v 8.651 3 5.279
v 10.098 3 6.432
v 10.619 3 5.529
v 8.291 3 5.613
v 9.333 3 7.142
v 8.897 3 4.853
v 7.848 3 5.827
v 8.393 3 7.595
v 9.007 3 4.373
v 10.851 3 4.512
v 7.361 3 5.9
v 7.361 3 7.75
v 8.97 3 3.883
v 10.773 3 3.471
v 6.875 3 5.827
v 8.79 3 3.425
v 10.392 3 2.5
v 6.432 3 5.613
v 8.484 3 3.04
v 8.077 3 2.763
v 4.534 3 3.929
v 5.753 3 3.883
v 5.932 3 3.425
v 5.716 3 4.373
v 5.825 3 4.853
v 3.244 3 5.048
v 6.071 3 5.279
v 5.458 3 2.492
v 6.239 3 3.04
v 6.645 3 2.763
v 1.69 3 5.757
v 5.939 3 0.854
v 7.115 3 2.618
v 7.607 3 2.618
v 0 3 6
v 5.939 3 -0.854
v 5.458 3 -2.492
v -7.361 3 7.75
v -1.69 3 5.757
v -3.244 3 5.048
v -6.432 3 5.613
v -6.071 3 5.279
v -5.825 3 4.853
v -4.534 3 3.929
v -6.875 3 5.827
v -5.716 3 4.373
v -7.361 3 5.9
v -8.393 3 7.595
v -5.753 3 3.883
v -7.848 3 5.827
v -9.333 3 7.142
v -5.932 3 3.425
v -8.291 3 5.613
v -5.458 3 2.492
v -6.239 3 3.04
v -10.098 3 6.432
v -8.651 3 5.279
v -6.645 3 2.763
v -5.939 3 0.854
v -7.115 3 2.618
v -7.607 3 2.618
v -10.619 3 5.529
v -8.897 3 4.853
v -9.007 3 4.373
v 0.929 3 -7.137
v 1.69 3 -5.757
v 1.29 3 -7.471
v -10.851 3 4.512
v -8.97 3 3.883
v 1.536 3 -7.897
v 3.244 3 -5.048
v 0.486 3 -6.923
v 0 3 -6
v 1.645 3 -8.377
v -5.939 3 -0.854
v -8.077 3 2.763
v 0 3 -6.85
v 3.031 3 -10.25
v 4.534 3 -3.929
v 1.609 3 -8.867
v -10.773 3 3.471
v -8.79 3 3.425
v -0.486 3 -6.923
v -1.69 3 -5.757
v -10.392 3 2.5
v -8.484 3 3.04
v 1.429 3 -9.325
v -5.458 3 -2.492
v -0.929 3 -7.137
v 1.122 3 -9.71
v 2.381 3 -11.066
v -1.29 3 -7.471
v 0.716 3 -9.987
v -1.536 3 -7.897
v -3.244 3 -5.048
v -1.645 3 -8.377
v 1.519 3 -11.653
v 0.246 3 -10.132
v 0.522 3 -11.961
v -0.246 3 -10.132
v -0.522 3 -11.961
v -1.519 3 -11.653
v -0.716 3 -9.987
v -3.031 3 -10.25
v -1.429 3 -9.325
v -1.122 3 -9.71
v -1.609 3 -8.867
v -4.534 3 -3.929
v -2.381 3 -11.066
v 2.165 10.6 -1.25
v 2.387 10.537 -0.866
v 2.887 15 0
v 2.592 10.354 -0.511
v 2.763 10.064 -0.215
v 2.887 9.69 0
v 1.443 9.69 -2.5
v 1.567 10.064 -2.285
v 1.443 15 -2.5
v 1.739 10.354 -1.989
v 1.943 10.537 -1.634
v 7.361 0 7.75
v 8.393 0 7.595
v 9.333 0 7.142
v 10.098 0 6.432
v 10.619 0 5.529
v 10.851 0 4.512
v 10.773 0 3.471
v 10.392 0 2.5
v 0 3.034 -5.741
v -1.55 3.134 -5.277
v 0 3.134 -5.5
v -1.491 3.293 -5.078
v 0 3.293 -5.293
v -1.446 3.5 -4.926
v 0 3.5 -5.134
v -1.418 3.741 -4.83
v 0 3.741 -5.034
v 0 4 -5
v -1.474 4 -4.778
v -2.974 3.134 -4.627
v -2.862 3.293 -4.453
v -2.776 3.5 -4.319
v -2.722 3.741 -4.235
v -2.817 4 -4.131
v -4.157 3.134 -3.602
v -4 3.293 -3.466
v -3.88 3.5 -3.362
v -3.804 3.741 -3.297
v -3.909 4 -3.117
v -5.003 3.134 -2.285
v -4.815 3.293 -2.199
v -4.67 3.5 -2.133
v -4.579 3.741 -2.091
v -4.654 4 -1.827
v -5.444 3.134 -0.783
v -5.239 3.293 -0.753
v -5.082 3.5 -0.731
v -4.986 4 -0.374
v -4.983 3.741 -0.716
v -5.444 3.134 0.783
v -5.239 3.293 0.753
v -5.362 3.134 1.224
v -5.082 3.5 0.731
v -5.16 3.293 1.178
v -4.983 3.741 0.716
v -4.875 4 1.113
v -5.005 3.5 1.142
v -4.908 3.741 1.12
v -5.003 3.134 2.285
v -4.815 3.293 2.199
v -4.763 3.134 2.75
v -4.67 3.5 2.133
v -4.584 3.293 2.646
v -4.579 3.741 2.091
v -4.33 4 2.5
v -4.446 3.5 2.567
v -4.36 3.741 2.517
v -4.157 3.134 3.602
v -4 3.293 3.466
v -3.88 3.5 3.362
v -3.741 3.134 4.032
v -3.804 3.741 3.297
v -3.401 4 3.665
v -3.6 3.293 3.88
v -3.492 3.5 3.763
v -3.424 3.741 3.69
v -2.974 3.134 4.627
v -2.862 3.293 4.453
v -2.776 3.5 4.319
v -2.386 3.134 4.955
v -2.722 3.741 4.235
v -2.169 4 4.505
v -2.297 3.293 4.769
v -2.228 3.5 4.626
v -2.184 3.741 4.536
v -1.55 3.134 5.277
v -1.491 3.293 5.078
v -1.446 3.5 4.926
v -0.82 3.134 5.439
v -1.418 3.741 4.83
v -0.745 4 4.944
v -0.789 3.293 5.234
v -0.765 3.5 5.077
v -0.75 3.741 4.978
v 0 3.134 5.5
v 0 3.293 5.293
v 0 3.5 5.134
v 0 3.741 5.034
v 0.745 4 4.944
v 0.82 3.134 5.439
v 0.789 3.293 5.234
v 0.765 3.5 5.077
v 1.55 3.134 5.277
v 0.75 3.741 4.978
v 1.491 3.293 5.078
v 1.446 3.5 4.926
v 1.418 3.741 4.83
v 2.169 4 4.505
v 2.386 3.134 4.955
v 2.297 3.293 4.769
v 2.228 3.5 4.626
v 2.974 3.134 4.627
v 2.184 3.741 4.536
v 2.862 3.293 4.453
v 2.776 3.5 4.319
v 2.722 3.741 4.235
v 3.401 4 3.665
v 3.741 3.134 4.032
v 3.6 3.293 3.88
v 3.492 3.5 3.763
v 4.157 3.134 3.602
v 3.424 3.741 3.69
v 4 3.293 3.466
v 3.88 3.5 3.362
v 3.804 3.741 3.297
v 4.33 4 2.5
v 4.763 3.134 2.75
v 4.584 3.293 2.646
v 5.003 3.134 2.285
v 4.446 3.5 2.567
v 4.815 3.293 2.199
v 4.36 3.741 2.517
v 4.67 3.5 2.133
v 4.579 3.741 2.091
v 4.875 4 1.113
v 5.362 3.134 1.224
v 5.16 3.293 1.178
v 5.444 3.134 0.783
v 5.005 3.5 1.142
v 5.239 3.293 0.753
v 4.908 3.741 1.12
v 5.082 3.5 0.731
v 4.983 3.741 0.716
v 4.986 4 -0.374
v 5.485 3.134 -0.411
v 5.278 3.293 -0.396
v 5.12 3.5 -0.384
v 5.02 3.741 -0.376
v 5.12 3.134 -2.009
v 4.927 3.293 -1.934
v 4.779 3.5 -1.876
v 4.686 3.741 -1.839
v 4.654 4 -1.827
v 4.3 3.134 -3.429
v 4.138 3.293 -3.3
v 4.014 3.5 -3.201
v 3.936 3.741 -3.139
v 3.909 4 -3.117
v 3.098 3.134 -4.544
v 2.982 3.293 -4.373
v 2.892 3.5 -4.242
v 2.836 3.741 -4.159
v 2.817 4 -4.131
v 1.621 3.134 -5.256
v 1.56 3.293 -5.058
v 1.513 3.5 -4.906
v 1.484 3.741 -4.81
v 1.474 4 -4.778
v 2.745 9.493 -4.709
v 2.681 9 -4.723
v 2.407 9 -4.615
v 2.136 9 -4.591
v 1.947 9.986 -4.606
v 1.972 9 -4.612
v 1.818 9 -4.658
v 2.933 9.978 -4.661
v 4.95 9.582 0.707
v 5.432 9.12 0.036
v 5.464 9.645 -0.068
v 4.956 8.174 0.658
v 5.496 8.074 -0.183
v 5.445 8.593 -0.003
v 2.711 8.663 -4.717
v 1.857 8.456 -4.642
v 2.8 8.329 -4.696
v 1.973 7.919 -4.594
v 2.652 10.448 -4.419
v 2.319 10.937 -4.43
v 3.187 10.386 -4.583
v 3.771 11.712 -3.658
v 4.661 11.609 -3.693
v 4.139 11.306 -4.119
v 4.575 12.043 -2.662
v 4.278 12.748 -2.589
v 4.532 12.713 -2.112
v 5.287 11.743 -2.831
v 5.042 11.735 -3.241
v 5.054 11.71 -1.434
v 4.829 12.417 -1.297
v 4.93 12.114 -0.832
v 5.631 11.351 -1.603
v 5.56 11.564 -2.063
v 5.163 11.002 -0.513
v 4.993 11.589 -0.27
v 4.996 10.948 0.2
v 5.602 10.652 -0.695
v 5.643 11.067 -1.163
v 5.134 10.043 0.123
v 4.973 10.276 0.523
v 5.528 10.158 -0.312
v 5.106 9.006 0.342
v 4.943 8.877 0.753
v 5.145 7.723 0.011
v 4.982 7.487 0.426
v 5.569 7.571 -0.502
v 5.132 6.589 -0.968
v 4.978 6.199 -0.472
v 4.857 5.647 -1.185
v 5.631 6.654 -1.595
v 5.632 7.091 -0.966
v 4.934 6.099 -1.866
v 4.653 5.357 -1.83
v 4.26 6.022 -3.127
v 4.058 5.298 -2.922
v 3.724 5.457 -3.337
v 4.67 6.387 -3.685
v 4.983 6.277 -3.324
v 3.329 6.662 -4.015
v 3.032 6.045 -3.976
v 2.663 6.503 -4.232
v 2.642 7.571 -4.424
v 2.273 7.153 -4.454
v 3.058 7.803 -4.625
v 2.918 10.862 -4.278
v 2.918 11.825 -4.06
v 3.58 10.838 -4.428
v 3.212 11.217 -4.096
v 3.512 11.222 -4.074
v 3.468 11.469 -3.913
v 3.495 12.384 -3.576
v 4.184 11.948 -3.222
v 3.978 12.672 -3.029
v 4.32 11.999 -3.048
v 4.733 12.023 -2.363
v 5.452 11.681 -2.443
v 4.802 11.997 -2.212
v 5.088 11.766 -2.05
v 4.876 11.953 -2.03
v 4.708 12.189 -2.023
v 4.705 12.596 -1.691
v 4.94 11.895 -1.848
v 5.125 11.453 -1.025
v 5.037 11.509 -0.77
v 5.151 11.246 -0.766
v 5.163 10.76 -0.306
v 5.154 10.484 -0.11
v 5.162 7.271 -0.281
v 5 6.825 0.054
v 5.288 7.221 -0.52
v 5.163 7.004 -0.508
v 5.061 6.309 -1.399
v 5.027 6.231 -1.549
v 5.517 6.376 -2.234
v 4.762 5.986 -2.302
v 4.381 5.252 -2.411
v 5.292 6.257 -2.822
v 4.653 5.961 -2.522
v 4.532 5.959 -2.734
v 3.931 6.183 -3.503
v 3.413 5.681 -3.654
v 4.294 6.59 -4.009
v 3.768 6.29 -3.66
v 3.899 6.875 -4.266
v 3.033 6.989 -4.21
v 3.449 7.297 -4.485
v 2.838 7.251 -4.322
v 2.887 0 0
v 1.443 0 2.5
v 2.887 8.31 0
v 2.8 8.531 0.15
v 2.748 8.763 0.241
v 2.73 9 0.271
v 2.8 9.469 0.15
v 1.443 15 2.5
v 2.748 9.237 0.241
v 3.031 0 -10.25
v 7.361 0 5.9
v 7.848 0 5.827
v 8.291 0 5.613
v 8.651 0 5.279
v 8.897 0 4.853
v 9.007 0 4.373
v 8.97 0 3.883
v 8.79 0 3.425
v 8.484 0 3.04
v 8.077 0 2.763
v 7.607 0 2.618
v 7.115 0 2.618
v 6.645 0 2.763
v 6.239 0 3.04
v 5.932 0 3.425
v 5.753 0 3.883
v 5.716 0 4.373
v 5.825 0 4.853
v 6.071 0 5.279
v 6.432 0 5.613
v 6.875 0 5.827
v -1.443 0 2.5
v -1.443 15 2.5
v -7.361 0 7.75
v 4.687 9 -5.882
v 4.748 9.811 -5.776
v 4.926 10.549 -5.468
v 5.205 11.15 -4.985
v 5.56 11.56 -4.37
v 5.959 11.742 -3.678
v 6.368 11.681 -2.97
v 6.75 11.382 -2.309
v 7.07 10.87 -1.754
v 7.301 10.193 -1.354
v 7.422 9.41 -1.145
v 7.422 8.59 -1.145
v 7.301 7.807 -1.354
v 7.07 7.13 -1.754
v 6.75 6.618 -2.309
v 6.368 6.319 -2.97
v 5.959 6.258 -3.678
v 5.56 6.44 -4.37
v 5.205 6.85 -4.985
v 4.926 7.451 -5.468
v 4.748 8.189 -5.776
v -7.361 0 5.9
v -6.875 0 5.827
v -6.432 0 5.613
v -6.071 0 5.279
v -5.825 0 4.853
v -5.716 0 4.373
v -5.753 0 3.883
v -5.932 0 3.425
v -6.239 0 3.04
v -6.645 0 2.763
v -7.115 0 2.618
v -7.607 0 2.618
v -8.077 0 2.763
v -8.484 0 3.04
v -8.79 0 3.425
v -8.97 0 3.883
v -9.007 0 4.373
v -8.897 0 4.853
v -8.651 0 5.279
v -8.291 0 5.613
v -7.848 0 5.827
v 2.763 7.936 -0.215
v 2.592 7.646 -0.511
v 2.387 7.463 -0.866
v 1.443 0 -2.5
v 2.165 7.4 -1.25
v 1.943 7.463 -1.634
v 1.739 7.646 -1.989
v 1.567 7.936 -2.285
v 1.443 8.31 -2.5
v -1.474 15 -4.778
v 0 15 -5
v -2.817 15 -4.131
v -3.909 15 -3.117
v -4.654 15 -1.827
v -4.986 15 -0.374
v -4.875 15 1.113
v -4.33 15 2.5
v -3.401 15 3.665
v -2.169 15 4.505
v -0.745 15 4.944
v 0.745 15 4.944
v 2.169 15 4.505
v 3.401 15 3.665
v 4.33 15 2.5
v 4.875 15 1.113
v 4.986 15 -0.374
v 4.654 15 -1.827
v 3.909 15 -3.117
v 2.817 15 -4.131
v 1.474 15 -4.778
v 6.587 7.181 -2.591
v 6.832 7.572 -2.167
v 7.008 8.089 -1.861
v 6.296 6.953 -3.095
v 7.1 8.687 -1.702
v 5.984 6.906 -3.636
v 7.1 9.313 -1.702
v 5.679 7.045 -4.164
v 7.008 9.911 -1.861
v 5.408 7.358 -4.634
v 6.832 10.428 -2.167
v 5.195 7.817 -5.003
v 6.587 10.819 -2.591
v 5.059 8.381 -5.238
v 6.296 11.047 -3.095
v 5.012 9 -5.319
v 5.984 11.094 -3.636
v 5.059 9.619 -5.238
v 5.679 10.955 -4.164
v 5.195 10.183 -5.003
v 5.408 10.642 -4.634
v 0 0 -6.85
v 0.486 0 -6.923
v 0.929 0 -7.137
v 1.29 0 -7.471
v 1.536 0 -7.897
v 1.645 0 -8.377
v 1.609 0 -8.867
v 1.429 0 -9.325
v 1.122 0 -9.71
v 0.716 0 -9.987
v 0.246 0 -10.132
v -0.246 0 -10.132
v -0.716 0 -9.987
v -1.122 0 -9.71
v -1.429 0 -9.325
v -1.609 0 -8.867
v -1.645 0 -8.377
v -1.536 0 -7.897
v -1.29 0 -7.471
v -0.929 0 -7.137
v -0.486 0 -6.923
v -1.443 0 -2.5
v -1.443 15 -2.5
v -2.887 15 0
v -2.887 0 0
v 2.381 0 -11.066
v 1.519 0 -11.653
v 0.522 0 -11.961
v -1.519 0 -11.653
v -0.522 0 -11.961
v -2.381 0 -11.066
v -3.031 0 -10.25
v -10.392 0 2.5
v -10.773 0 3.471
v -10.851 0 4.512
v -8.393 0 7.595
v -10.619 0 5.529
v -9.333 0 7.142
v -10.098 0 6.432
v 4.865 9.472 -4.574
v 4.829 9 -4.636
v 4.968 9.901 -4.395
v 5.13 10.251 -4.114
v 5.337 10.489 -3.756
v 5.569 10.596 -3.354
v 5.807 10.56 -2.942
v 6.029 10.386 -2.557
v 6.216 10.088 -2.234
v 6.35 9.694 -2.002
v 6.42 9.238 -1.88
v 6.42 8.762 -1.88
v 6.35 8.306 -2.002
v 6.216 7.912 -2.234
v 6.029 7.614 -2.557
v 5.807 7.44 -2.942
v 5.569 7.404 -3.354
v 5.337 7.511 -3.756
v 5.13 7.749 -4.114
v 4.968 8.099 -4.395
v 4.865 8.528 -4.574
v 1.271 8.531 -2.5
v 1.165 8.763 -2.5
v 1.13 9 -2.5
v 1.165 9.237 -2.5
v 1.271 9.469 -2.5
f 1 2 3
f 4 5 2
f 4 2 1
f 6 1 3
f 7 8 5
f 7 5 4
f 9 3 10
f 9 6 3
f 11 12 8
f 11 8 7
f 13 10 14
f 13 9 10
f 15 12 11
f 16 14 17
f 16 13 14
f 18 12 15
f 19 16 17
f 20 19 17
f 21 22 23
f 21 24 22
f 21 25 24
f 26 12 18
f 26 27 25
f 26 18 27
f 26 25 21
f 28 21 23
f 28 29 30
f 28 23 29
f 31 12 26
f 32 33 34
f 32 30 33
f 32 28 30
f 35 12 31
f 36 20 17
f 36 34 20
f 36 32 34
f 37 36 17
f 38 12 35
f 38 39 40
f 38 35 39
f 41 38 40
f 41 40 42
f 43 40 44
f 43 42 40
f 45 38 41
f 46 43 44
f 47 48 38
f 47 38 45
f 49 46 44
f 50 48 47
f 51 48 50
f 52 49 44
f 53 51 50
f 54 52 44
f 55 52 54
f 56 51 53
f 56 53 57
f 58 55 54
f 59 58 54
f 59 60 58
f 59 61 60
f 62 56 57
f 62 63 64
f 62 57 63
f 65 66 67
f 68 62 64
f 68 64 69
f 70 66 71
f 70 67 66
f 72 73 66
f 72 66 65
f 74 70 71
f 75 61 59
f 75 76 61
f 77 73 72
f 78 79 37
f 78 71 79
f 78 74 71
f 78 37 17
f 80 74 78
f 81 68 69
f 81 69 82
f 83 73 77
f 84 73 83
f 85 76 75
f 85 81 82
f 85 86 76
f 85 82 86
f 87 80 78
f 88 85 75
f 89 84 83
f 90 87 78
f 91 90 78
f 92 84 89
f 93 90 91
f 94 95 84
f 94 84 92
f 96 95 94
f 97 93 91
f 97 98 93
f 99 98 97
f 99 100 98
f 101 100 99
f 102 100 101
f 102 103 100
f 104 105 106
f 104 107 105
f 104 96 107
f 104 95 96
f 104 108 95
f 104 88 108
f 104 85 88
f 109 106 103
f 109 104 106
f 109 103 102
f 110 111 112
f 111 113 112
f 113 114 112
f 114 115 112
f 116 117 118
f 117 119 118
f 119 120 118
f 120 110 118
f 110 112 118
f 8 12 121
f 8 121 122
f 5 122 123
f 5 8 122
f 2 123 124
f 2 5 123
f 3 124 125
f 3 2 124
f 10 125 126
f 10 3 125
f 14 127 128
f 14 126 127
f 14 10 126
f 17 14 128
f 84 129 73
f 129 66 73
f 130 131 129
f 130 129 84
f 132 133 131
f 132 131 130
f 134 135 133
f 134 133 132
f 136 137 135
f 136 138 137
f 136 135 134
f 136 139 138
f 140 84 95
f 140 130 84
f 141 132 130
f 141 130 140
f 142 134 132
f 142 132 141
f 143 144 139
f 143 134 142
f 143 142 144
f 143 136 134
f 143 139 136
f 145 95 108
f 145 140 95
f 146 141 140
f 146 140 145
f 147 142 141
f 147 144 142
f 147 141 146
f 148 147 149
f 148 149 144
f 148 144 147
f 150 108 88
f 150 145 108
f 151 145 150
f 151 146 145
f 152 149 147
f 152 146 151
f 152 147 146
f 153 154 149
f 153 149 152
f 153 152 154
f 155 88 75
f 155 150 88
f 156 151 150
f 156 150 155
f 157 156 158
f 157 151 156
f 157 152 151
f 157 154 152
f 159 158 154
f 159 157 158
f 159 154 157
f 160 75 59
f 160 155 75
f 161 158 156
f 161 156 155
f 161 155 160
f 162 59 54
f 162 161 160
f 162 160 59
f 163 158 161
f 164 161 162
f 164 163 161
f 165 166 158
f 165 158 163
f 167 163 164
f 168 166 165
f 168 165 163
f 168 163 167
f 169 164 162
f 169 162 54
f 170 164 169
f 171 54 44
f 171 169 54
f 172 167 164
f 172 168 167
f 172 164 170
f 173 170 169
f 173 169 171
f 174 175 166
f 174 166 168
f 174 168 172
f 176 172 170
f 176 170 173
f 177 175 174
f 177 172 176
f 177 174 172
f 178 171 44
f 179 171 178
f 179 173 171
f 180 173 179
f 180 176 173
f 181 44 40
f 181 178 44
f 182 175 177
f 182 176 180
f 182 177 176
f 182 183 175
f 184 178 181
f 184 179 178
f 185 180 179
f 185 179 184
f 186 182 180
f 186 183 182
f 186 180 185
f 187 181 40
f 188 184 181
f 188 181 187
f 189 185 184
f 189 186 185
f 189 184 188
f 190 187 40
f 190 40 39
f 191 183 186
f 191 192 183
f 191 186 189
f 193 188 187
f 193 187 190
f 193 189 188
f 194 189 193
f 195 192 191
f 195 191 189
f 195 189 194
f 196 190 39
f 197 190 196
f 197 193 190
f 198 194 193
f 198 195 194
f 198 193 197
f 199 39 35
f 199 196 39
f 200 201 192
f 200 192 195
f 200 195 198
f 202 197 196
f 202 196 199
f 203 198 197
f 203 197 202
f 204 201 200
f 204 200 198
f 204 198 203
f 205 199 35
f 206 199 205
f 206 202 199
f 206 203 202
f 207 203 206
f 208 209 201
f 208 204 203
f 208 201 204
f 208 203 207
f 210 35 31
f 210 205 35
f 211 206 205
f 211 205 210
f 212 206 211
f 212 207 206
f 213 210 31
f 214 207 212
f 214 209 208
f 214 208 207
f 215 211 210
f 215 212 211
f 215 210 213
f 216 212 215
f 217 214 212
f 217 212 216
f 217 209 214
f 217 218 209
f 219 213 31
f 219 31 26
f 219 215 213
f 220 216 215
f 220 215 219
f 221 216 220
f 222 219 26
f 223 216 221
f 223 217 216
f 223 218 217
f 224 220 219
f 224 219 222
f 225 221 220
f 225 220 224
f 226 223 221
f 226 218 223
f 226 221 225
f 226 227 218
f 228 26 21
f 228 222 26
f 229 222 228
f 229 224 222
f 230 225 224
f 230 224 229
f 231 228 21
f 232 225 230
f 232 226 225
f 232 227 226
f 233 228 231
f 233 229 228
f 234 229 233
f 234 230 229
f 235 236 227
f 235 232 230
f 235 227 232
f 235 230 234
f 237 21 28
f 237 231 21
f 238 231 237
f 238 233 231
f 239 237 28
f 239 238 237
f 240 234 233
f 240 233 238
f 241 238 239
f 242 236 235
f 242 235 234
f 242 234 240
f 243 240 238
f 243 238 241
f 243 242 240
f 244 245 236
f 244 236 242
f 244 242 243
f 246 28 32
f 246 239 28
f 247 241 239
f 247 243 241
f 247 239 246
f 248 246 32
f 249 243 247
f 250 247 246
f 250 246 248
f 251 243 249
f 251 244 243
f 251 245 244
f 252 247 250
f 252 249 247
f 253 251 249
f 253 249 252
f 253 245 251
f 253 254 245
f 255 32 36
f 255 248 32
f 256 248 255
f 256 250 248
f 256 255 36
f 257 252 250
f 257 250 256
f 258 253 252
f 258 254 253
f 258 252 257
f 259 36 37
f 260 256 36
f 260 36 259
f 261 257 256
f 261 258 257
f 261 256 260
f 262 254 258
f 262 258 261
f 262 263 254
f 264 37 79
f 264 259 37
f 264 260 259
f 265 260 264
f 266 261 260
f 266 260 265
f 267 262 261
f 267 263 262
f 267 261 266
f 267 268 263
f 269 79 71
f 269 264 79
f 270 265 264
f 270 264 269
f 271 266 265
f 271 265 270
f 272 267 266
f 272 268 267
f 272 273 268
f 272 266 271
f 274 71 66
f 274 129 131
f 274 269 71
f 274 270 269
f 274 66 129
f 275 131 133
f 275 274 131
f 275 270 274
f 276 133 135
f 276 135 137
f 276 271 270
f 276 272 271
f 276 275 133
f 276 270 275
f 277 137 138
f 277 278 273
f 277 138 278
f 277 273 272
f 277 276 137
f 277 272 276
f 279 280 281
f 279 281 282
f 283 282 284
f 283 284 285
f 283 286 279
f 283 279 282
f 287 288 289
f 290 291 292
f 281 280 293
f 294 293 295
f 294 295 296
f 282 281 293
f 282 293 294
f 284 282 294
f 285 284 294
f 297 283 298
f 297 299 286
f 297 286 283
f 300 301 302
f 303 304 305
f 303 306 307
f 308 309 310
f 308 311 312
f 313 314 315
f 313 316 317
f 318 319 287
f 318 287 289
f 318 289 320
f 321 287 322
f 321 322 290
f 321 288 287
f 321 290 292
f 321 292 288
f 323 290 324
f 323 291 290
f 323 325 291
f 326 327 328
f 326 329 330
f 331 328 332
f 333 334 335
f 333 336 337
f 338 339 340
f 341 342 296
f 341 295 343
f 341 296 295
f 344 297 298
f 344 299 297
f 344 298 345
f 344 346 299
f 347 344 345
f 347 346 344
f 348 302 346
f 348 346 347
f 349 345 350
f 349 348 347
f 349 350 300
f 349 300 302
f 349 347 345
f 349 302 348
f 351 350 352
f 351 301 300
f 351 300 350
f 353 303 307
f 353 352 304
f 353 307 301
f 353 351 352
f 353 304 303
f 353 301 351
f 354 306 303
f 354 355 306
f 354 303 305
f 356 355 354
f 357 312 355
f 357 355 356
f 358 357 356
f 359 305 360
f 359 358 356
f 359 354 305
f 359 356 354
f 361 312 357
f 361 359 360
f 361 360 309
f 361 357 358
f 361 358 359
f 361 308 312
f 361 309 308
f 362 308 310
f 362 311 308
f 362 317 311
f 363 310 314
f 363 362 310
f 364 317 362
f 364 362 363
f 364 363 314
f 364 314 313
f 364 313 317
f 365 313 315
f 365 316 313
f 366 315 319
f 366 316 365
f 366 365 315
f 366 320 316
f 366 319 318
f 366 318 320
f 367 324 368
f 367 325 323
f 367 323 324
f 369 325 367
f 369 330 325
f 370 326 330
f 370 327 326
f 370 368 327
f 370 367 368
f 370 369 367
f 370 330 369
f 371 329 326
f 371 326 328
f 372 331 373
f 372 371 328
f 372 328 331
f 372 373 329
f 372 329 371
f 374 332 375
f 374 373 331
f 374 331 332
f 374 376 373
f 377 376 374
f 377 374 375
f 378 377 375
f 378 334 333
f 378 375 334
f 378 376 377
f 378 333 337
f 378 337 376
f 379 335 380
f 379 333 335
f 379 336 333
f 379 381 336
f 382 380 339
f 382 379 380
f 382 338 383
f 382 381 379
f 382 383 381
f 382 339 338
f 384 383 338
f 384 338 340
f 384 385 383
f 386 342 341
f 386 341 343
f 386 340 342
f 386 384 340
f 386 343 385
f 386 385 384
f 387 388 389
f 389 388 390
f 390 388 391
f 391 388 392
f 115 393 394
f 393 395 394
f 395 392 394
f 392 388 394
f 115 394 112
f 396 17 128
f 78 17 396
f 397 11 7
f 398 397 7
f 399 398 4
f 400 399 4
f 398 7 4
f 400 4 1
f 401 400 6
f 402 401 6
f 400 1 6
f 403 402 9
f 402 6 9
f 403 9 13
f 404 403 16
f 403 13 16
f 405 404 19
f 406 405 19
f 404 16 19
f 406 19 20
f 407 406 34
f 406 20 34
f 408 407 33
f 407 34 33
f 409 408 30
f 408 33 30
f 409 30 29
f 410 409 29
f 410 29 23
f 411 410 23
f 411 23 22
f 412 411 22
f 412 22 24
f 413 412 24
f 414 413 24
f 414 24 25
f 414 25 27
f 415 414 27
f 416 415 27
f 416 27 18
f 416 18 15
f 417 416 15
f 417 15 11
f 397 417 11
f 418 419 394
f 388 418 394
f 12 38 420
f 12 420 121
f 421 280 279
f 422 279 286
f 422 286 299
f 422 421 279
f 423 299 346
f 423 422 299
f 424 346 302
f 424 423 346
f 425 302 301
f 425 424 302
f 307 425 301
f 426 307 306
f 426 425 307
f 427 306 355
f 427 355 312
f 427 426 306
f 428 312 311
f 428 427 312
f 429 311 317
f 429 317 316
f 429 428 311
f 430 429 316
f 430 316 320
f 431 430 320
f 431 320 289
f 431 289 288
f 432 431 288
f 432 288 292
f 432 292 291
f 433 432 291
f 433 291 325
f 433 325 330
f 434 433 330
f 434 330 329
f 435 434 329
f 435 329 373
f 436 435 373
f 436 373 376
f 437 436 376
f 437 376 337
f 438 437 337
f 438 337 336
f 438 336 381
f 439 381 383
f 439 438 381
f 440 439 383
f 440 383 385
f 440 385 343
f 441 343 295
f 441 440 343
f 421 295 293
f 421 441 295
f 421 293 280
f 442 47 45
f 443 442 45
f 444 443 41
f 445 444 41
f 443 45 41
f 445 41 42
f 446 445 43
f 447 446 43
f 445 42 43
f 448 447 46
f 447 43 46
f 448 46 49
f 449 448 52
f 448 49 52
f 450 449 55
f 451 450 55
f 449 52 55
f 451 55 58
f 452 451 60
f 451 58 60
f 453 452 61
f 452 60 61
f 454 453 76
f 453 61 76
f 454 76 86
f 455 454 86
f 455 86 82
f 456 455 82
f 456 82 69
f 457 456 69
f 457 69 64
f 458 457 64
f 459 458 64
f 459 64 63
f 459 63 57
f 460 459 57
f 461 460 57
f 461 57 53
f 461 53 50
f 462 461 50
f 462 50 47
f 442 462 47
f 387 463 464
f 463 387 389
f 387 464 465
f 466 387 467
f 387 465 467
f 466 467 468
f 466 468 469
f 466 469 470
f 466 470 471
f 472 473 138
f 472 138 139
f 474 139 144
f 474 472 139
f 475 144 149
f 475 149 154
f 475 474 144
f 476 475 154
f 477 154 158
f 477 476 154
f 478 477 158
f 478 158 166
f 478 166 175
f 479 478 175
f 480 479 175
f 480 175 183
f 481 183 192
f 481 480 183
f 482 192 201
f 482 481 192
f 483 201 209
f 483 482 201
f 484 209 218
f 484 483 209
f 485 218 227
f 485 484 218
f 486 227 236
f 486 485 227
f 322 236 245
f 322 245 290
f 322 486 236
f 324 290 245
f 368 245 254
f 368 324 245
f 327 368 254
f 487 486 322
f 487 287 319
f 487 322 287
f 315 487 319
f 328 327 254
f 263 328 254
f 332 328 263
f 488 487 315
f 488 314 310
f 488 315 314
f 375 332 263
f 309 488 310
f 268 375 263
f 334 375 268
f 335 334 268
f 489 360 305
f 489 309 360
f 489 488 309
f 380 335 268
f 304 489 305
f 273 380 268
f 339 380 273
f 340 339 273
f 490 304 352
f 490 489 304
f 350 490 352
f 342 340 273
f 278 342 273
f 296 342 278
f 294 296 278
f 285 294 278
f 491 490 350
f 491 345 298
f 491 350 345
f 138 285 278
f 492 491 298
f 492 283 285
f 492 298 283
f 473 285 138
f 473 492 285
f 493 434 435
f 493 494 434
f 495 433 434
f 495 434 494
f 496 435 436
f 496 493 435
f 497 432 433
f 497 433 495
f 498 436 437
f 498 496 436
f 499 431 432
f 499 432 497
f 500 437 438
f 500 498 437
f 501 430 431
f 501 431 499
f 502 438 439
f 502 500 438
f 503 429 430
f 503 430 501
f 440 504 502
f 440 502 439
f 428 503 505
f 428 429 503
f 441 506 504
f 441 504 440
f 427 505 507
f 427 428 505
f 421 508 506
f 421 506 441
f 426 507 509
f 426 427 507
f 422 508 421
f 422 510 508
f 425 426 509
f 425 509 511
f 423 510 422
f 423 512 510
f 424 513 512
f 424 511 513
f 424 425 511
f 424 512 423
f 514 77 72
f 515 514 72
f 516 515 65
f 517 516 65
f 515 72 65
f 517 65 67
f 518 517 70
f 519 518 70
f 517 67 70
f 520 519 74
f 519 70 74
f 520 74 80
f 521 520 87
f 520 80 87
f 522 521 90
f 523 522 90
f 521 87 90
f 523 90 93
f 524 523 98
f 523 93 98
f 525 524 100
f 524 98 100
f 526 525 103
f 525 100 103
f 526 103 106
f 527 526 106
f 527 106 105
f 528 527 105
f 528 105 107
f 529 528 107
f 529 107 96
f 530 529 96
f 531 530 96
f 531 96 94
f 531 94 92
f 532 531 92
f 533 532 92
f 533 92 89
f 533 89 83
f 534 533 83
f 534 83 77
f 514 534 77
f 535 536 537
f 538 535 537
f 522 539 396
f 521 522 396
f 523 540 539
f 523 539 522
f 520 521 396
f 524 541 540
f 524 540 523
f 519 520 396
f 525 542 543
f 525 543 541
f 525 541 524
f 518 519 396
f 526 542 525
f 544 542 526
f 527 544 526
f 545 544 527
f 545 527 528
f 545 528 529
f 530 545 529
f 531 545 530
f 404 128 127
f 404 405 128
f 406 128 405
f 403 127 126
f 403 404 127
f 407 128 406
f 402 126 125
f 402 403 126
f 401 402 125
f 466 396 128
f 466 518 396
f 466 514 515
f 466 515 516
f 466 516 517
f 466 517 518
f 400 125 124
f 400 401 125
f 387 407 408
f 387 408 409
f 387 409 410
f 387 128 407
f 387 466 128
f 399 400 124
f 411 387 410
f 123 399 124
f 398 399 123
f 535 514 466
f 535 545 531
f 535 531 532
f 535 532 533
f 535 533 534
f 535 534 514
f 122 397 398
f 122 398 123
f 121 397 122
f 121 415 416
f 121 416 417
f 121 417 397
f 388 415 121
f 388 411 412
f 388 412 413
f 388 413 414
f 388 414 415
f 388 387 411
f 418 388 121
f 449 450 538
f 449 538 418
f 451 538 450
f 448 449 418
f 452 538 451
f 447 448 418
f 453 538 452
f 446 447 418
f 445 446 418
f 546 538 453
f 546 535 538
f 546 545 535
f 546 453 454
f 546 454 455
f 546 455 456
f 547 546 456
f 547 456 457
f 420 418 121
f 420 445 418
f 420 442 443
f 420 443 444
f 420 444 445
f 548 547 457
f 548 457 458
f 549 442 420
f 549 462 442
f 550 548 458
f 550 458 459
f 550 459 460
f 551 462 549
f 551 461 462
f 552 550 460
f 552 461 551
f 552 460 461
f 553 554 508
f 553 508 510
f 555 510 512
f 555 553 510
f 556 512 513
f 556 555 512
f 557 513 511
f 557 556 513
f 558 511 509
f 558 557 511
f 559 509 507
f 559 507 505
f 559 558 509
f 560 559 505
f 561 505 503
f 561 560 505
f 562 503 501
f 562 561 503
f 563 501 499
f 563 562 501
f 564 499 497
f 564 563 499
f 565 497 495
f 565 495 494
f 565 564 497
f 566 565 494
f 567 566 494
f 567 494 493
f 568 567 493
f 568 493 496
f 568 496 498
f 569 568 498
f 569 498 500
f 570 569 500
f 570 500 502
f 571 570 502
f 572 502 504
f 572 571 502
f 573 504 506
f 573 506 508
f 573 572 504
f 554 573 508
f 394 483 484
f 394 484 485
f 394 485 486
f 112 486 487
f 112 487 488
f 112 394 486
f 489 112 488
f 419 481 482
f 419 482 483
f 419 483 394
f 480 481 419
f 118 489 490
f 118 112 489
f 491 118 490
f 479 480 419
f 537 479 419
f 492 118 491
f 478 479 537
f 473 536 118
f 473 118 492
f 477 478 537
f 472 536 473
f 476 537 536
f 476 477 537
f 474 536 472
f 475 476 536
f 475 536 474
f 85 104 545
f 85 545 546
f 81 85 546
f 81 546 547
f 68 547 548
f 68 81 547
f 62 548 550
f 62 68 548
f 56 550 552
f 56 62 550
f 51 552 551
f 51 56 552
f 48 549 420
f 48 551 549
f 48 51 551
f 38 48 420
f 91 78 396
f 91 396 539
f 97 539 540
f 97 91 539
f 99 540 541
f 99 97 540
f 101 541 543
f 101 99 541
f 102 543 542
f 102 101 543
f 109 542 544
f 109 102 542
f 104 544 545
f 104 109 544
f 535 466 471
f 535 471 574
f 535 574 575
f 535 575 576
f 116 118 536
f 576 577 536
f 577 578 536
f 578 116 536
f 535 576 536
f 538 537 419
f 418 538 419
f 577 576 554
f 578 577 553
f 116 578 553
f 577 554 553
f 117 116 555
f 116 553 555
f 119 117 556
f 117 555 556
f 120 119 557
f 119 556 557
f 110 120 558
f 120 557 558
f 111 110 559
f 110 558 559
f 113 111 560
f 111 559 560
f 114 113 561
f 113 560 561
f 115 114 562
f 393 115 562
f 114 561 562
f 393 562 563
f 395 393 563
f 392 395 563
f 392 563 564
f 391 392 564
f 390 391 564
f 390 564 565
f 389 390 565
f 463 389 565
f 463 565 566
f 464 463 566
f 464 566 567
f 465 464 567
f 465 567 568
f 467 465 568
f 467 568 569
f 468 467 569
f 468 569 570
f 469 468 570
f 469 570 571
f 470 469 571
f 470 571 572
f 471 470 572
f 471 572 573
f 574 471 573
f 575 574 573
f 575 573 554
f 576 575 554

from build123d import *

# Parameters (mm, degrees)
SKETCH4_R                = 1.65
CUT_EXTRUDE4_DEPTH       = 21.784609691
SKETCH5_OUTSIDE_W        = 33.422
SKETCH5_OUTSIDE_H        = 33.422
CUT_EXTRUDE5_DEPTH       = 21.784609691
CUT_EXTRUDE2_DEPTH       = 16
BOSS_EXTRUDE1_REACH      = 27.258
BOSS_EXTRUDE1_END_RADIUS = 5
SKETCH3_R                = 2.75
CUT_EXTRUDE6_REACH       = 27.258
SKETCH6_R                = 1.6
FILLET1_R                = 1
CHAMFER1_SIZE            = 0.5
FILLET2_R                = 1


with BuildPart() as part:
    # Sketch1 → Revolve1 (revolve)
    with BuildSketch(Plane(origin=(0, 0, 0), x_dir=(0, 0, -1), z_dir=(1, 0, 0))):
        Polygon((0, 0), (12, 0), (12, 3), (5, 3), (5, 15), (0, 15), (0, 5.353547723), align=None)
    revolve(axis=Axis((0, 5.353547723, 0), (0, 1, 0)))

    # Sketch4 → Cut-Extrude4 (cut, through all)
    with BuildSketch(Plane(origin=(0, 3, 0), x_dir=(1, 0, 0), z_dir=(0, 1, 0))):
        with Locations(Location((0, 8.5, 0), (0, 0, 270))):
            Circle(SKETCH4_R)
        with Locations(Location((7.361215932, -4.25, 0), (0, 0, 270))):
            Circle(SKETCH4_R)
        with Locations(Location((-7.361215932, -4.25, 0), (0, 0, 270))):
            Circle(SKETCH4_R)
    extrude(amount=-CUT_EXTRUDE4_DEPTH, mode=Mode.SUBTRACT)

    # Sketch5 outside → Cut-Extrude5 (cut, through all)
    with BuildSketch(Plane(origin=(0, 3, 0), x_dir=(1, 0, 0), z_dir=(0, 1, 0))):
        Rectangle(SKETCH5_OUTSIDE_W, SKETCH5_OUTSIDE_H)
        with BuildLine():
            Line((-3.031088913, 10.25), (-10.392304845, -2.5))
            ThreePointArc((-10.392304845, -2.5), (-10.392304845, -6), (-7.361215932, -7.75))
            Line((-7.361215932, -7.75), (7.361215932, -7.75))
            ThreePointArc((7.361215932, -7.75), (10.392304845, -6), (10.392304845, -2.5))
            Line((10.392304845, -2.5), (3.031088913, 10.25))
            ThreePointArc((3.031088913, 10.25), (0, 12), (-3.031088913, 10.25))
        make_face(mode=Mode.SUBTRACT)
    extrude(amount=-CUT_EXTRUDE5_DEPTH, mode=Mode.SUBTRACT)

    # Sketch2 → Cut-Extrude2 (cut)
    with BuildSketch(Plane(origin=(0, 15, 0), x_dir=(1, 0, 0), z_dir=(0, 1, 0))):
        Polygon((2.886751346, 0), (1.443375673, 2.5), (-1.443375673, 2.5), (-2.886751346, 0), (-1.443375673, -2.5), (1.443375673, -2.5), align=None)
    extrude(amount=-CUT_EXTRUDE2_DEPTH, mode=Mode.SUBTRACT)

    # Boss-Extrude1: up to this cylinder (the profile starts outside it)
    boss_extrude1_end = Plane(origin=(0, 9, 0), z_dir=(0, -1, 0)) * Cylinder(BOSS_EXTRUDE1_END_RADIUS, 65.516, mode=Mode.PRIVATE)
    # Sketch3 → Boss-Extrude1 (add, up to the surface)
    with BuildSketch(Plane(origin=(6.062177826, 0, -3.5), x_dir=(-0.5000000000000001, 0, -0.8660254037844386), z_dir=(0.8660254037844386, 0, -0.5000000000000001)), mode=Mode.PRIVATE) as boss_extrude1_sk1:
        with Locations((0, 9)):
            Circle(SKETCH3_R)
    boss_extrude1_tool1 = extrude(boss_extrude1_sk1.sketch, amount=-BOSS_EXTRUDE1_REACH, mode=Mode.PRIVATE) - boss_extrude1_end
    add(boss_extrude1_tool1.solids().sort_by_distance((6.062178, 9, -3.5))[0])

    # Sketch6 → Cut-Extrude6 (cut, up to next)
    with BuildSketch(Plane(origin=(6.062177826, 0, -3.5), x_dir=(-0.5000000000000001, 0, -0.8660254037844386), z_dir=(0.8660254037844386, 0, -0.5000000000000001)), mode=Mode.PRIVATE) as cut_extrude6_sk1:
        with Locations((0, 9)):
            Circle(SKETCH6_R)
    cut_extrude6_tool1 = extrude(cut_extrude6_sk1.sketch, amount=-CUT_EXTRUDE6_REACH, mode=Mode.PRIVATE) & part.part
    add(cut_extrude6_tool1.solids().sort_by_distance((6.062178, 9, -3.5))[0], mode=Mode.SUBTRACT)

    # Fillet1
    fillet1_edges = [part.edges().sort_by_distance(p)[0] for p in [
        (0, 3, 5),
    ]]
    fillet(fillet1_edges, radius=FILLET1_R)

    # Chamfer1
    chamfer1_edges = [part.edges().sort_by_distance(p)[0] for p in [
        (6.862177826, 9, -2.114359354),
    ]]
    chamfer(chamfer1_edges, length=CHAMFER1_SIZE)

    # Fillet2
    fillet2_edges = [part.edges().sort_by_distance(p)[0] for p in [
        (4.991369035, 8.999999998, 0.293658225),
    ]]
    fillet(fillet2_edges, radius=FILLET2_R)


solid = part.part
